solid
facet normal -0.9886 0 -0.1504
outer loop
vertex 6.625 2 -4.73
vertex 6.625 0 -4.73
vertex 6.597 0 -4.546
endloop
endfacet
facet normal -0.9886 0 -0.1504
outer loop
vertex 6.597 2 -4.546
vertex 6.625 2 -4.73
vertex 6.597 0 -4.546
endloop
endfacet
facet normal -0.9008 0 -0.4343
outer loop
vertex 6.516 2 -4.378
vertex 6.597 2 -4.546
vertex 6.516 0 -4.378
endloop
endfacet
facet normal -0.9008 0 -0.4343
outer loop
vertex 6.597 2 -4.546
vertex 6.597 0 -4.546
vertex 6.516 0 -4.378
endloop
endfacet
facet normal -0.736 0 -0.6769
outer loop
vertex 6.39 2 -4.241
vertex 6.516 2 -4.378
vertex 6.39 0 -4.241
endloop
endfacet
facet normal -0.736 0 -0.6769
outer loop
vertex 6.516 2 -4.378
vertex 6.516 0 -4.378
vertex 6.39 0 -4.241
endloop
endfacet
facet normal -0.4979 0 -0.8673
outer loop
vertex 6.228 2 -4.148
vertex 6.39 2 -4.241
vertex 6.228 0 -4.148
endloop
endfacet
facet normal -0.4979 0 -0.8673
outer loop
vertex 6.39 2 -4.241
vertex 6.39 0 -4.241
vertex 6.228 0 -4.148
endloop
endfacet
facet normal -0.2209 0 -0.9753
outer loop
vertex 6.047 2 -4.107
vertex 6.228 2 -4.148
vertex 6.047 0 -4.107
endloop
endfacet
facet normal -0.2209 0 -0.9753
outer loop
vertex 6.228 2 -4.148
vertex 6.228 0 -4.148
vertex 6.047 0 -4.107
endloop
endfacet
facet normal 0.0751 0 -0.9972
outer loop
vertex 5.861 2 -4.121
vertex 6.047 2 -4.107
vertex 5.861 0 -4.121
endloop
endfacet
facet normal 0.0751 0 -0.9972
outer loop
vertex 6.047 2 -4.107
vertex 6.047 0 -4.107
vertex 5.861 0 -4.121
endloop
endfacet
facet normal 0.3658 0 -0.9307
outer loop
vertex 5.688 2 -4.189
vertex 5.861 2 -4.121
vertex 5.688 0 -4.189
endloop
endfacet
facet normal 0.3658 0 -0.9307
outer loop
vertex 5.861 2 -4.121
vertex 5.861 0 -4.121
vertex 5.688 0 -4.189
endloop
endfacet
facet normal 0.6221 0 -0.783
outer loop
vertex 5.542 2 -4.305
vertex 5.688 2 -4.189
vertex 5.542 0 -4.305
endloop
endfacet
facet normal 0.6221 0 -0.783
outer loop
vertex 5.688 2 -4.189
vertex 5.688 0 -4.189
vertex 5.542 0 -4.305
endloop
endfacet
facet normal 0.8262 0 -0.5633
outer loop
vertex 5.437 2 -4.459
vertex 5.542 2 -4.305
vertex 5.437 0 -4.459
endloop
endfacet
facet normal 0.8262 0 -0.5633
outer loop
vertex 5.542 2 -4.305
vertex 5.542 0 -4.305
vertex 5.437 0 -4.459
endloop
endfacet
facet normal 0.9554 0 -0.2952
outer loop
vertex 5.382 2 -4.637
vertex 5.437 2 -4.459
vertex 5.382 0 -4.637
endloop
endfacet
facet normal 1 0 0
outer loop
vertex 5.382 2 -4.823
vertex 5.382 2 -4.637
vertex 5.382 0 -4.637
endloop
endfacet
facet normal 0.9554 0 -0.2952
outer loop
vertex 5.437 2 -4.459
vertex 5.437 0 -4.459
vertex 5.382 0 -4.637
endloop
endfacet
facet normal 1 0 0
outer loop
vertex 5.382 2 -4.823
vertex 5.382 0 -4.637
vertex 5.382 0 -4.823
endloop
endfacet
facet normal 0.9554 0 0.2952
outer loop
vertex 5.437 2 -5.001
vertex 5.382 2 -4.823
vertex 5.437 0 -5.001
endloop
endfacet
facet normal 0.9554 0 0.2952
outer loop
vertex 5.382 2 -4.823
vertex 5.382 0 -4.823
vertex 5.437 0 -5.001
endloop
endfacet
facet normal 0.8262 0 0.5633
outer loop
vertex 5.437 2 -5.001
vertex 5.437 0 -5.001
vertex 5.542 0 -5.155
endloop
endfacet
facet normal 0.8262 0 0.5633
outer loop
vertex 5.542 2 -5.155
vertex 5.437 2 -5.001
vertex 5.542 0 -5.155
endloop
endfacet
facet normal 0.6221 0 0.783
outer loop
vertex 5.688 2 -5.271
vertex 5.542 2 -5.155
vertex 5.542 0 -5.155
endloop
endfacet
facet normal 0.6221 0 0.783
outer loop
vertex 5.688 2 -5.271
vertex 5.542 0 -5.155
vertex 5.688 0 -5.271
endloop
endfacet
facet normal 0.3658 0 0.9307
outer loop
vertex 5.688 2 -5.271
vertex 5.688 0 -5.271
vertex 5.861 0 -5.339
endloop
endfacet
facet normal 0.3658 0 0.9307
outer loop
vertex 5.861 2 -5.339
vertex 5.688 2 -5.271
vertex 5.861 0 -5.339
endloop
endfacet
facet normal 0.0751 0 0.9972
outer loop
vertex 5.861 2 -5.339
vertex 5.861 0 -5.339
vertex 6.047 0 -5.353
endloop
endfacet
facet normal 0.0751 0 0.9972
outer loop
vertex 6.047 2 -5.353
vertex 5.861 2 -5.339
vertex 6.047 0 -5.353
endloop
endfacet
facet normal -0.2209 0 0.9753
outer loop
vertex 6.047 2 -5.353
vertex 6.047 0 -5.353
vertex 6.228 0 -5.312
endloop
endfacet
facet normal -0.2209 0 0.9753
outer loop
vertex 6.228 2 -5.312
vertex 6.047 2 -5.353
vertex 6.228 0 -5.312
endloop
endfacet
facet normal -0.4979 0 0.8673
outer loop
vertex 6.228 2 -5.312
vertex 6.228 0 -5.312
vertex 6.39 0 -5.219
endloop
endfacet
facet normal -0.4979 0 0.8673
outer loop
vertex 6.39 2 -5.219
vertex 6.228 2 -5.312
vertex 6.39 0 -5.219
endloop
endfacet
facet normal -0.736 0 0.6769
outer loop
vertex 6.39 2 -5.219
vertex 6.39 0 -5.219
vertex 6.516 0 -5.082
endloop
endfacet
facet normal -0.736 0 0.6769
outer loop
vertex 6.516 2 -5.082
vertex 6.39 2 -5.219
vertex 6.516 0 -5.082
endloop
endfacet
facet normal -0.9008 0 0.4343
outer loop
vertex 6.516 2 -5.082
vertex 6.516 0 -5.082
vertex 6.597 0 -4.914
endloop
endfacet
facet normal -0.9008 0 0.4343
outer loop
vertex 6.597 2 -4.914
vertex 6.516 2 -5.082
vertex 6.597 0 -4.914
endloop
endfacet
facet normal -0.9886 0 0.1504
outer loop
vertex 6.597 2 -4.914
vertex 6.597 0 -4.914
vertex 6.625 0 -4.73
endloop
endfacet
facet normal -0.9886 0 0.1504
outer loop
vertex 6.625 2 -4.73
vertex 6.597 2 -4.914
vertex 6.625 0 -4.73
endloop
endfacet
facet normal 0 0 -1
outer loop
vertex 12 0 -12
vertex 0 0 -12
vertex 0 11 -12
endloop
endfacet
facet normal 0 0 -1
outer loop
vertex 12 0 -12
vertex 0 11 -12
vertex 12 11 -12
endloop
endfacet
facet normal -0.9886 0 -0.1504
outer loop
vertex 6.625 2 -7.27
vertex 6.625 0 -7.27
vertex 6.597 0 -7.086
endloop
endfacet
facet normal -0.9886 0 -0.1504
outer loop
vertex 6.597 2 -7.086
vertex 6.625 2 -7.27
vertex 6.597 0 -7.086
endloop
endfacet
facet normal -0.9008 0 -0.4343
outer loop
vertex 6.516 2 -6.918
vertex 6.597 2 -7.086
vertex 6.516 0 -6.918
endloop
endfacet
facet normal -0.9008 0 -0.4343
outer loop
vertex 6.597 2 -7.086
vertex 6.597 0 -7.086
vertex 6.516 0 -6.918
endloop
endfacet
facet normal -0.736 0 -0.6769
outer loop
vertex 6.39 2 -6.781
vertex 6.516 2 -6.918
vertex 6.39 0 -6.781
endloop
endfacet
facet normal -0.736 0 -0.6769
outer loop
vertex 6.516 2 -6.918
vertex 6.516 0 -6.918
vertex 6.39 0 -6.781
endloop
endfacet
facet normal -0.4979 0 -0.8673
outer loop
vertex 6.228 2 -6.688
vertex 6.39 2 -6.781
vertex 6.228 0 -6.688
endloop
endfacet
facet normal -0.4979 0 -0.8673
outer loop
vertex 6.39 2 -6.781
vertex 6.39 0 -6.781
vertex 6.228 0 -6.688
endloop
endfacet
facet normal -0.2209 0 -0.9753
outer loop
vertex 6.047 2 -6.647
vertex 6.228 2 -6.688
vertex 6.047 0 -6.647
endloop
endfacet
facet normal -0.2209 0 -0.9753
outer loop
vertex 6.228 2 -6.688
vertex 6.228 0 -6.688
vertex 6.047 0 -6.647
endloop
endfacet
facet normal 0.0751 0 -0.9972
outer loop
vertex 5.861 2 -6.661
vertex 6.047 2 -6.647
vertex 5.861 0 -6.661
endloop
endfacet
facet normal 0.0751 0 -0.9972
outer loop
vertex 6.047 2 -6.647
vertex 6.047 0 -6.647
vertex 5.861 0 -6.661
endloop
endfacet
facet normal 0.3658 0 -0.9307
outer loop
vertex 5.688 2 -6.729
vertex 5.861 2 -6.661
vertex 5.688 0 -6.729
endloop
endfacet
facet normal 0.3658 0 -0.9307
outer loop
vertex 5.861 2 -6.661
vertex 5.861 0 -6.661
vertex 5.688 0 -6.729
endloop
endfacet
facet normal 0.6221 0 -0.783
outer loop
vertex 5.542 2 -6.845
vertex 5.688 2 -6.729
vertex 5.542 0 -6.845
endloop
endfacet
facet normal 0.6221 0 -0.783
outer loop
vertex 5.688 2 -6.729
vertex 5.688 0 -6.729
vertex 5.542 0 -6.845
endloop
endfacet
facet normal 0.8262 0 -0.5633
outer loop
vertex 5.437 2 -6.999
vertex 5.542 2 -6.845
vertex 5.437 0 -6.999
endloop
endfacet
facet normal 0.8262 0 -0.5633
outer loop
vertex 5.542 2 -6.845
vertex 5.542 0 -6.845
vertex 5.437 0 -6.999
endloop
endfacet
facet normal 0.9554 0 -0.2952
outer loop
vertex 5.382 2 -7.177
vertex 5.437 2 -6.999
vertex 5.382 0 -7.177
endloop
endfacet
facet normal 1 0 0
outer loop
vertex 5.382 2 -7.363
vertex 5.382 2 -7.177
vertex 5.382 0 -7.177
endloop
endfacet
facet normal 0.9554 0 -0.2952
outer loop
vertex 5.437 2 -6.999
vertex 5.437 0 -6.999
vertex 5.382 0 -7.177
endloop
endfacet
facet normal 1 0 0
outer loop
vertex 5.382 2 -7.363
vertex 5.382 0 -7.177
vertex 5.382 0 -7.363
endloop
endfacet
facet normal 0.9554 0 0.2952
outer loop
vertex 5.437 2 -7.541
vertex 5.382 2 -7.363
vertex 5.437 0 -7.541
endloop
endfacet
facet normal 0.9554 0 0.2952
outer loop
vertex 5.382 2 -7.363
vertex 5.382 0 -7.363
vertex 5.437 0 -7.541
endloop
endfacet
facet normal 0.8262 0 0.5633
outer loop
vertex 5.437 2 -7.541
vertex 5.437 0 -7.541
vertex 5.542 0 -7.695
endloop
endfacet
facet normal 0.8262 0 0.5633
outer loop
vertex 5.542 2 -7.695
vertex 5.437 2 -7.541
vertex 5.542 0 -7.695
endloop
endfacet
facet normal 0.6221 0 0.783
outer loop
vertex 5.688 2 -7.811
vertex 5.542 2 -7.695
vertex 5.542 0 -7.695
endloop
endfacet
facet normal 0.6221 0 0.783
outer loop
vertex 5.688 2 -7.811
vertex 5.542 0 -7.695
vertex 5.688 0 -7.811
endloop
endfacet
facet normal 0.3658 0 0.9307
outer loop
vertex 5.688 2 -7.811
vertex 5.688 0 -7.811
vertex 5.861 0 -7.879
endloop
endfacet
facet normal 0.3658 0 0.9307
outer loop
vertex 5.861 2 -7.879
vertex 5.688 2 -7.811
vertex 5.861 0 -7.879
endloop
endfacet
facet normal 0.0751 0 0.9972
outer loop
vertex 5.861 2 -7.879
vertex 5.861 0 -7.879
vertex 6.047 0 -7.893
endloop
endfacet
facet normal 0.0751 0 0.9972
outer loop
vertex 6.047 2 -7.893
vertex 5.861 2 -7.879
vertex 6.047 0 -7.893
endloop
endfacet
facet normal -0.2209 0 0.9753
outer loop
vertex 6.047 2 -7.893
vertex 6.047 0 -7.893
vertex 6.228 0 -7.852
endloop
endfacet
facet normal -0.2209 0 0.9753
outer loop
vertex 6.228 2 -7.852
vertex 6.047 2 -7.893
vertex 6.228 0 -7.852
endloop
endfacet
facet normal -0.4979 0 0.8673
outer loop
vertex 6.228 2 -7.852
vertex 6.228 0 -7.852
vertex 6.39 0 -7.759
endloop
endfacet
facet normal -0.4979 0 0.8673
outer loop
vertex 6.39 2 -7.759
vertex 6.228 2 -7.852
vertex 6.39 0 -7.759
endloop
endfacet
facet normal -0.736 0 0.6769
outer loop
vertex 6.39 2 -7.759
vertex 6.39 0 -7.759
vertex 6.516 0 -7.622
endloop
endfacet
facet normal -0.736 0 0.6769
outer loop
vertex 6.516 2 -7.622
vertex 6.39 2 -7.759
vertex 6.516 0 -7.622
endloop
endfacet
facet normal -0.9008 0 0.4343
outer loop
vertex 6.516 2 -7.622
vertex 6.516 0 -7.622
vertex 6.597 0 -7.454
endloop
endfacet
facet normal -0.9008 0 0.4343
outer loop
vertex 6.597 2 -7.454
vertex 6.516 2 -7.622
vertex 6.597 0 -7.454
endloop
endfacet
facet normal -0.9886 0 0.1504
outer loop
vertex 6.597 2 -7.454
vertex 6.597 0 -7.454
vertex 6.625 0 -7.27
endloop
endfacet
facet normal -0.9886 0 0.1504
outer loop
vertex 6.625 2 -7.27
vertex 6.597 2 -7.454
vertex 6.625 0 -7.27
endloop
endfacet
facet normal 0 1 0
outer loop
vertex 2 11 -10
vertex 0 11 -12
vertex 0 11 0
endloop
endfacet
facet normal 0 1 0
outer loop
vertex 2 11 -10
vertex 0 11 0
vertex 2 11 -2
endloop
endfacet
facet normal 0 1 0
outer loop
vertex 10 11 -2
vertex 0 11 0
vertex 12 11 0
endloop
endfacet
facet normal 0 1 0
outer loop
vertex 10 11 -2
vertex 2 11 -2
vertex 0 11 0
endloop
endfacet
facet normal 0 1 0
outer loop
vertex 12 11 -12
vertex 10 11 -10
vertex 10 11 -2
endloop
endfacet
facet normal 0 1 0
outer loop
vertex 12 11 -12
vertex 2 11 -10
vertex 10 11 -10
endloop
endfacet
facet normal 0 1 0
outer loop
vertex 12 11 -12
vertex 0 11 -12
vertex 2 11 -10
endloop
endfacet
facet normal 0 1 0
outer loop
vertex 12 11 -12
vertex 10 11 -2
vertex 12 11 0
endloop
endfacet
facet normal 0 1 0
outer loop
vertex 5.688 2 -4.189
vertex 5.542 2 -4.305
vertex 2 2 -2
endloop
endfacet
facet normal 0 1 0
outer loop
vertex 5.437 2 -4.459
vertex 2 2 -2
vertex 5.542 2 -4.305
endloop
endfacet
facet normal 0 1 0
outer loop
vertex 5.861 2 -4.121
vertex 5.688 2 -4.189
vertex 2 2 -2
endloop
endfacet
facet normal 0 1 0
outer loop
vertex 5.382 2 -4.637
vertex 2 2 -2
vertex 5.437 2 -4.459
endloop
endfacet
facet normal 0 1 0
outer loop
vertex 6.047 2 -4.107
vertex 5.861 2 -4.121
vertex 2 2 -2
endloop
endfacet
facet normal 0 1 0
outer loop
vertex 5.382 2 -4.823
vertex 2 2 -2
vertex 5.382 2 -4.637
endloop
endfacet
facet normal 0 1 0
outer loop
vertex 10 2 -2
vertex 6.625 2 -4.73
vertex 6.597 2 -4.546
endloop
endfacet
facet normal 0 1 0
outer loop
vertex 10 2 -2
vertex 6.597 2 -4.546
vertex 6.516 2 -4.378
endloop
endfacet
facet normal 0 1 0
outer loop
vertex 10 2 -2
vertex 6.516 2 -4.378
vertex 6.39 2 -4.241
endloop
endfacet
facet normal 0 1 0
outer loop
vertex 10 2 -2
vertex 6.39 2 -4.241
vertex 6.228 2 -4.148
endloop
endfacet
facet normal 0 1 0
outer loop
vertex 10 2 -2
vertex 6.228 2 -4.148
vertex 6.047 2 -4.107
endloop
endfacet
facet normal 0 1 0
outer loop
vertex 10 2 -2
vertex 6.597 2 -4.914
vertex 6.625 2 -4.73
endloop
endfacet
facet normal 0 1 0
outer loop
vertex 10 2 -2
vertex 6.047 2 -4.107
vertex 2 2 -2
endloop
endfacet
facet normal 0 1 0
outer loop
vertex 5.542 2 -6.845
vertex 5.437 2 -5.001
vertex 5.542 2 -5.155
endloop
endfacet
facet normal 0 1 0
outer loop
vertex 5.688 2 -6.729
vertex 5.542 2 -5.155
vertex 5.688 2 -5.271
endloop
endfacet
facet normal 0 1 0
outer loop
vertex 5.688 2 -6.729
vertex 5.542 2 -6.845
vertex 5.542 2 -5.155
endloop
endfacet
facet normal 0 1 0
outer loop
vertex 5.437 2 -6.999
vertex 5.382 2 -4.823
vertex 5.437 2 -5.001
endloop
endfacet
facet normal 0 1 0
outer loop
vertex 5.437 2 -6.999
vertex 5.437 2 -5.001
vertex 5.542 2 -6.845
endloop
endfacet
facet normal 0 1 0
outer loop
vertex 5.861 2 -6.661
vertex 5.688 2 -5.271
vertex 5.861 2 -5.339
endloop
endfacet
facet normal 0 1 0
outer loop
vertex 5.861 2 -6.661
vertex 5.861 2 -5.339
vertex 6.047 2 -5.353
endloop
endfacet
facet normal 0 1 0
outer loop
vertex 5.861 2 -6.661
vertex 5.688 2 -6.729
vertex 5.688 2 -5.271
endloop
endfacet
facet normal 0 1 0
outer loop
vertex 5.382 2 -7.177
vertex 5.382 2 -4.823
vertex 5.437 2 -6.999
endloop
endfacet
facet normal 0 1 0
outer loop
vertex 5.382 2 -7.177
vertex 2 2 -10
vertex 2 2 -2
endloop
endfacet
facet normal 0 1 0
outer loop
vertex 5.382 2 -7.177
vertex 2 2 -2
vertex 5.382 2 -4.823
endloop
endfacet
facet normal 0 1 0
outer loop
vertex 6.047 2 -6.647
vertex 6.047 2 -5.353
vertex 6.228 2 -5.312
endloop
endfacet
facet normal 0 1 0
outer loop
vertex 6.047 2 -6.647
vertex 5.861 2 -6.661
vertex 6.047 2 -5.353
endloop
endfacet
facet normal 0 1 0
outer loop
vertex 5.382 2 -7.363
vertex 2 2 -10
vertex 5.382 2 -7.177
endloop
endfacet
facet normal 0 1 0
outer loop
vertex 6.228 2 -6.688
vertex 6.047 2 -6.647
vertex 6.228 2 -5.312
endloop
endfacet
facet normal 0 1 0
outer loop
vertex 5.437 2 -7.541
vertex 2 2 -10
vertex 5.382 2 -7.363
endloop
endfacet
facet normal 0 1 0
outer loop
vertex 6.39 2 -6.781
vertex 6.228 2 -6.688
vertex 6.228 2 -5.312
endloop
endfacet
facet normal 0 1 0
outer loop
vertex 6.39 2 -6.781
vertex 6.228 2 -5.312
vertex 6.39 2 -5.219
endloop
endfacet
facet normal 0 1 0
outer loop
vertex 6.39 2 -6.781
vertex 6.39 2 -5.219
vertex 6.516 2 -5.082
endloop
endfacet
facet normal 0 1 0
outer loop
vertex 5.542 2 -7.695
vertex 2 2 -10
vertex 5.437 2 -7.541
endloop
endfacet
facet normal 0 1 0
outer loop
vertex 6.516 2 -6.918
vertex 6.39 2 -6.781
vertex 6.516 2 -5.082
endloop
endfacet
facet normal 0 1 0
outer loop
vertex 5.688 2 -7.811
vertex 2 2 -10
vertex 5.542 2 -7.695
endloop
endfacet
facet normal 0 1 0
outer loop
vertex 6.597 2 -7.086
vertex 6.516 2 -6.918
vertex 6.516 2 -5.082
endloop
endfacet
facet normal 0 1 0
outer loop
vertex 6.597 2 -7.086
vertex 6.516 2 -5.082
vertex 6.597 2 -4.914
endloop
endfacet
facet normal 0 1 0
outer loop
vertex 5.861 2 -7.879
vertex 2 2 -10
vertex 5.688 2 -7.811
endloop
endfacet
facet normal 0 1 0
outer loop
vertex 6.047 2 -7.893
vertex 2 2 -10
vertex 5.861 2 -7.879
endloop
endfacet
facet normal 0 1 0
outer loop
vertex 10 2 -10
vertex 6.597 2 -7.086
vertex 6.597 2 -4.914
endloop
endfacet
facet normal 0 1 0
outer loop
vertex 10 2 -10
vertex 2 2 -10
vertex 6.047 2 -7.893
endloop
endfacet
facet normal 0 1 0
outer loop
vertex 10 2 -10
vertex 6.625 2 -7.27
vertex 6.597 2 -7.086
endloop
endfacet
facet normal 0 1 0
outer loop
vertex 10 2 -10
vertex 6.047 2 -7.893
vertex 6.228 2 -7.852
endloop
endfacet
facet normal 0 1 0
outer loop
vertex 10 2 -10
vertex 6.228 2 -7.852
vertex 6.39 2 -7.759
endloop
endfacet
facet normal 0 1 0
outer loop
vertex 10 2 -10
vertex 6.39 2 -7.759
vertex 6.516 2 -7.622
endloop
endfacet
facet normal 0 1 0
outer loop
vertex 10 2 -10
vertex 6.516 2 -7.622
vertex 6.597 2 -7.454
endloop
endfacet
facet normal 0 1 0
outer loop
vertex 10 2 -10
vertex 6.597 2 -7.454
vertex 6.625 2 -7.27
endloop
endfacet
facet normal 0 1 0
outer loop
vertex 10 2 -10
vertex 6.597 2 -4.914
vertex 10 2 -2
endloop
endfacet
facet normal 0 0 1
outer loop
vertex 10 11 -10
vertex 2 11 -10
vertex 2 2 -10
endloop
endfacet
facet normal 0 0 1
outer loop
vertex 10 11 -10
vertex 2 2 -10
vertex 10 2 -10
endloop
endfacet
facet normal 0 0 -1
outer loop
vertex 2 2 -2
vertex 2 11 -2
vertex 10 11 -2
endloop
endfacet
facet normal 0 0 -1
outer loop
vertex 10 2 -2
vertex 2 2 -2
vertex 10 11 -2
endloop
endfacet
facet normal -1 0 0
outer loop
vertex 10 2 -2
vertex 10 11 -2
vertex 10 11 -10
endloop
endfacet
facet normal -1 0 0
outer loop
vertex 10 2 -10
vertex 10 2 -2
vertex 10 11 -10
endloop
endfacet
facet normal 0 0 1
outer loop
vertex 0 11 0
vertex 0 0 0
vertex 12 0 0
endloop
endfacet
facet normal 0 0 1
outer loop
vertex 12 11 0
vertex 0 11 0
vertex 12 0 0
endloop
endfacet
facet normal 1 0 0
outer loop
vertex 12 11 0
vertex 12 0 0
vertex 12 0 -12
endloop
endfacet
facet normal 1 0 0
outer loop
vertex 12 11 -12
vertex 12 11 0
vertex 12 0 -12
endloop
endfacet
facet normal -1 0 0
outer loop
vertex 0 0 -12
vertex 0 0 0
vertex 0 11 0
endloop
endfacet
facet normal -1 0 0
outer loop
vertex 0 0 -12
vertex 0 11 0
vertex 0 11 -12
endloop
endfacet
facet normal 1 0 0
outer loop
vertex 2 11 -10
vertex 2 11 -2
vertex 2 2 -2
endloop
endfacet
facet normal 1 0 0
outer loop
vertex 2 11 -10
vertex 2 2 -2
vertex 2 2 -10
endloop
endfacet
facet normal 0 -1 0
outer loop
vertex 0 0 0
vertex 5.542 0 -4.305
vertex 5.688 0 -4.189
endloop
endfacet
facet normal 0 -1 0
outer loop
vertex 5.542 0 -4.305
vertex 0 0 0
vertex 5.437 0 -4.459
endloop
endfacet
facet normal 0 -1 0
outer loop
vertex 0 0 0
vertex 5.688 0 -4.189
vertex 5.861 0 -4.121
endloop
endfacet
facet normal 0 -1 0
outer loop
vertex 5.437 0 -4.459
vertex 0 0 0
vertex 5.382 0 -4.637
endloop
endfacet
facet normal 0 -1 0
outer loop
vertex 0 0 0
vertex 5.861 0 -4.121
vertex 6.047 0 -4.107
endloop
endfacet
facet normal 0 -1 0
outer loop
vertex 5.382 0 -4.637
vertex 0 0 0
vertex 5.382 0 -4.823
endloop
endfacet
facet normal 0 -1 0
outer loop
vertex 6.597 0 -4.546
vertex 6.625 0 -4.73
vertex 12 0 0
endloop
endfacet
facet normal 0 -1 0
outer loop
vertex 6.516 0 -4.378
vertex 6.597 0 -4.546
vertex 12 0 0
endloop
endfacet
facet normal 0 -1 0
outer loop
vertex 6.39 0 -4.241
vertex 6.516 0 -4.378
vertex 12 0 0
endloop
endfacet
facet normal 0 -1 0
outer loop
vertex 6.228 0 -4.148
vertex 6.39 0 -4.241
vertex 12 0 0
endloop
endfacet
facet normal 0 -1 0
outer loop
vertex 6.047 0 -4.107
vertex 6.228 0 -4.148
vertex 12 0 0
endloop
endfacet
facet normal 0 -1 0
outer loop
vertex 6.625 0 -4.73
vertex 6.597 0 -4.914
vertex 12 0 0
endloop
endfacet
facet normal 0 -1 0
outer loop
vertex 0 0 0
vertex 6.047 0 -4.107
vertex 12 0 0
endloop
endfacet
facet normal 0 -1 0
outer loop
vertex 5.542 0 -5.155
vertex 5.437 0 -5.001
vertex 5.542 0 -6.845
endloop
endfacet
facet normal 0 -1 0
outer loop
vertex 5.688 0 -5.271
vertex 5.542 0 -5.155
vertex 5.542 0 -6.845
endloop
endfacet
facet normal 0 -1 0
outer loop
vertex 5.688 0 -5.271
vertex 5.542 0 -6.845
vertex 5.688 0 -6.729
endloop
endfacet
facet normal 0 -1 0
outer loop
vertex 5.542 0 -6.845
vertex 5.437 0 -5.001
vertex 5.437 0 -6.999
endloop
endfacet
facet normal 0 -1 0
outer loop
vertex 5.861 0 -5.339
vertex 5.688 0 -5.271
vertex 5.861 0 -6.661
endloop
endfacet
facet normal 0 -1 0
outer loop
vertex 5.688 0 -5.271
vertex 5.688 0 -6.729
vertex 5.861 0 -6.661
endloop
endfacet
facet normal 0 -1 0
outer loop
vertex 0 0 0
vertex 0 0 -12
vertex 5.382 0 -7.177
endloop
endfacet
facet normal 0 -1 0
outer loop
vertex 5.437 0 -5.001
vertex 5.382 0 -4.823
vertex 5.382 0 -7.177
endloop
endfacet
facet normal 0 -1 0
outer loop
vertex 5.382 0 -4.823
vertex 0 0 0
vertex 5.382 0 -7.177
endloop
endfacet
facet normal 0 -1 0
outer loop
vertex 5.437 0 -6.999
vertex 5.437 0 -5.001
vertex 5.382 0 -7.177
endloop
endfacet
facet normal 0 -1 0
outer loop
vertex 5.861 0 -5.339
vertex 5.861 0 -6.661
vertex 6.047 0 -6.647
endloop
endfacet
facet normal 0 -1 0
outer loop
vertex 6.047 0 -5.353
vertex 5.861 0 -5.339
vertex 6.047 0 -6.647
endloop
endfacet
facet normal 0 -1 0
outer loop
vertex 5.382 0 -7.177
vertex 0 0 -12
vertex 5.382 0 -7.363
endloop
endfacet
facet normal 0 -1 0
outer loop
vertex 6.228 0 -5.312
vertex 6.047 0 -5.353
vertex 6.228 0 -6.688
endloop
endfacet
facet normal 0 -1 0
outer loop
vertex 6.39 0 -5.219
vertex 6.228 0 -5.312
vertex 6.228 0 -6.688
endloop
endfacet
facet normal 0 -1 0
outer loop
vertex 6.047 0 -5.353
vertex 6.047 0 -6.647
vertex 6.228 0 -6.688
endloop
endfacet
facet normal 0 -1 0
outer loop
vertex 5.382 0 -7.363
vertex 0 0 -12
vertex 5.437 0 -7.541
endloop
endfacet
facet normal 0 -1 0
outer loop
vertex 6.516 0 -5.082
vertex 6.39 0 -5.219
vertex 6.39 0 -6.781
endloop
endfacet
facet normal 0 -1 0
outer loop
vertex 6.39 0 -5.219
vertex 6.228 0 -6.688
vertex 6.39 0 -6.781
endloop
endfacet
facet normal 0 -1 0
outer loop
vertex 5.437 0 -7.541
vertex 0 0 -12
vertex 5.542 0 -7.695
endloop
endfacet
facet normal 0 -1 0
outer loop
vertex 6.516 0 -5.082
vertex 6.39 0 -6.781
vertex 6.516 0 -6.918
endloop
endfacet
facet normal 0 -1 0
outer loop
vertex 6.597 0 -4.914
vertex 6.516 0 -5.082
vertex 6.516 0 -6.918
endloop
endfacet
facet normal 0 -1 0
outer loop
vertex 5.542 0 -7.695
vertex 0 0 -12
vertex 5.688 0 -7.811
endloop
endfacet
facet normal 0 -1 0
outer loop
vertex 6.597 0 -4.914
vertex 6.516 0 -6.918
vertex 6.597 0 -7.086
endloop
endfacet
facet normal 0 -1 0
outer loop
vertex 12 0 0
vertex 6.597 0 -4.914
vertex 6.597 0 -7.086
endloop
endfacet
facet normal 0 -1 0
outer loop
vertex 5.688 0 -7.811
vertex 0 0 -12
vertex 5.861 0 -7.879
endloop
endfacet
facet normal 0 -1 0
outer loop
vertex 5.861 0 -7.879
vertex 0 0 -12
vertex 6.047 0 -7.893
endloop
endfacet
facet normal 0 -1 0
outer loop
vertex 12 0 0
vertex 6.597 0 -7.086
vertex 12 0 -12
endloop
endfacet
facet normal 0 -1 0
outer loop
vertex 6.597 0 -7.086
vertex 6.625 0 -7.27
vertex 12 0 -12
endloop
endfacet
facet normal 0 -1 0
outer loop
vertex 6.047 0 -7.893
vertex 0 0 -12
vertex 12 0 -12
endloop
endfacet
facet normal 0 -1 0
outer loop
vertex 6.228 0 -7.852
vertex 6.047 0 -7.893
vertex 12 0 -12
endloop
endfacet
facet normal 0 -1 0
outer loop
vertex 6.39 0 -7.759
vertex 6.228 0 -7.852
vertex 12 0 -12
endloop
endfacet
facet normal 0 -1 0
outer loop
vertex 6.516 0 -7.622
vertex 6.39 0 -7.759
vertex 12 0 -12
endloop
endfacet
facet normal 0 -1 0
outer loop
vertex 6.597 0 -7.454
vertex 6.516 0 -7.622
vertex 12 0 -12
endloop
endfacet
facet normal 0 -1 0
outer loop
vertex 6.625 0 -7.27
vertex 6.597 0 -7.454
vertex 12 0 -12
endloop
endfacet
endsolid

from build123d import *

# Parameters (mm, degrees)
SKETCH1_W           = 12
SKETCH1_H           = 12
BOSS_EXTRUDE1_DEPTH = 11
SHELL1_T            = -2
SKETCH3_R           = 0.625
CUT_EXTRUDE1_DEPTH  = 10


with BuildPart() as part:
    # Sketch1 → Boss-Extrude1 (new body)
    with BuildSketch(Plane(origin=(0, 0, 0), x_dir=(1, 0, 0), z_dir=(0, 1, 0))):
        with Locations((6, 6)):
            Rectangle(SKETCH1_W, SKETCH1_H)
    extrude(amount=BOSS_EXTRUDE1_DEPTH)

    # Shell1
    shell1_openings = [part.faces().sort_by_distance(p)[0] for p in [
        (6, 11, -6),
    ]]
    offset(amount=SHELL1_T, openings=shell1_openings, kind=Kind.INTERSECTION)

    # Sketch3 → Cut-Extrude1 (cut)
    with BuildSketch(Plane.XZ):
        with Locations((6, -4.73)):
            Circle(SKETCH3_R)
        with Locations((6, -7.27)):
            Circle(SKETCH3_R)
    extrude(amount=-CUT_EXTRUDE1_DEPTH, mode=Mode.SUBTRACT)


solid = part.part
